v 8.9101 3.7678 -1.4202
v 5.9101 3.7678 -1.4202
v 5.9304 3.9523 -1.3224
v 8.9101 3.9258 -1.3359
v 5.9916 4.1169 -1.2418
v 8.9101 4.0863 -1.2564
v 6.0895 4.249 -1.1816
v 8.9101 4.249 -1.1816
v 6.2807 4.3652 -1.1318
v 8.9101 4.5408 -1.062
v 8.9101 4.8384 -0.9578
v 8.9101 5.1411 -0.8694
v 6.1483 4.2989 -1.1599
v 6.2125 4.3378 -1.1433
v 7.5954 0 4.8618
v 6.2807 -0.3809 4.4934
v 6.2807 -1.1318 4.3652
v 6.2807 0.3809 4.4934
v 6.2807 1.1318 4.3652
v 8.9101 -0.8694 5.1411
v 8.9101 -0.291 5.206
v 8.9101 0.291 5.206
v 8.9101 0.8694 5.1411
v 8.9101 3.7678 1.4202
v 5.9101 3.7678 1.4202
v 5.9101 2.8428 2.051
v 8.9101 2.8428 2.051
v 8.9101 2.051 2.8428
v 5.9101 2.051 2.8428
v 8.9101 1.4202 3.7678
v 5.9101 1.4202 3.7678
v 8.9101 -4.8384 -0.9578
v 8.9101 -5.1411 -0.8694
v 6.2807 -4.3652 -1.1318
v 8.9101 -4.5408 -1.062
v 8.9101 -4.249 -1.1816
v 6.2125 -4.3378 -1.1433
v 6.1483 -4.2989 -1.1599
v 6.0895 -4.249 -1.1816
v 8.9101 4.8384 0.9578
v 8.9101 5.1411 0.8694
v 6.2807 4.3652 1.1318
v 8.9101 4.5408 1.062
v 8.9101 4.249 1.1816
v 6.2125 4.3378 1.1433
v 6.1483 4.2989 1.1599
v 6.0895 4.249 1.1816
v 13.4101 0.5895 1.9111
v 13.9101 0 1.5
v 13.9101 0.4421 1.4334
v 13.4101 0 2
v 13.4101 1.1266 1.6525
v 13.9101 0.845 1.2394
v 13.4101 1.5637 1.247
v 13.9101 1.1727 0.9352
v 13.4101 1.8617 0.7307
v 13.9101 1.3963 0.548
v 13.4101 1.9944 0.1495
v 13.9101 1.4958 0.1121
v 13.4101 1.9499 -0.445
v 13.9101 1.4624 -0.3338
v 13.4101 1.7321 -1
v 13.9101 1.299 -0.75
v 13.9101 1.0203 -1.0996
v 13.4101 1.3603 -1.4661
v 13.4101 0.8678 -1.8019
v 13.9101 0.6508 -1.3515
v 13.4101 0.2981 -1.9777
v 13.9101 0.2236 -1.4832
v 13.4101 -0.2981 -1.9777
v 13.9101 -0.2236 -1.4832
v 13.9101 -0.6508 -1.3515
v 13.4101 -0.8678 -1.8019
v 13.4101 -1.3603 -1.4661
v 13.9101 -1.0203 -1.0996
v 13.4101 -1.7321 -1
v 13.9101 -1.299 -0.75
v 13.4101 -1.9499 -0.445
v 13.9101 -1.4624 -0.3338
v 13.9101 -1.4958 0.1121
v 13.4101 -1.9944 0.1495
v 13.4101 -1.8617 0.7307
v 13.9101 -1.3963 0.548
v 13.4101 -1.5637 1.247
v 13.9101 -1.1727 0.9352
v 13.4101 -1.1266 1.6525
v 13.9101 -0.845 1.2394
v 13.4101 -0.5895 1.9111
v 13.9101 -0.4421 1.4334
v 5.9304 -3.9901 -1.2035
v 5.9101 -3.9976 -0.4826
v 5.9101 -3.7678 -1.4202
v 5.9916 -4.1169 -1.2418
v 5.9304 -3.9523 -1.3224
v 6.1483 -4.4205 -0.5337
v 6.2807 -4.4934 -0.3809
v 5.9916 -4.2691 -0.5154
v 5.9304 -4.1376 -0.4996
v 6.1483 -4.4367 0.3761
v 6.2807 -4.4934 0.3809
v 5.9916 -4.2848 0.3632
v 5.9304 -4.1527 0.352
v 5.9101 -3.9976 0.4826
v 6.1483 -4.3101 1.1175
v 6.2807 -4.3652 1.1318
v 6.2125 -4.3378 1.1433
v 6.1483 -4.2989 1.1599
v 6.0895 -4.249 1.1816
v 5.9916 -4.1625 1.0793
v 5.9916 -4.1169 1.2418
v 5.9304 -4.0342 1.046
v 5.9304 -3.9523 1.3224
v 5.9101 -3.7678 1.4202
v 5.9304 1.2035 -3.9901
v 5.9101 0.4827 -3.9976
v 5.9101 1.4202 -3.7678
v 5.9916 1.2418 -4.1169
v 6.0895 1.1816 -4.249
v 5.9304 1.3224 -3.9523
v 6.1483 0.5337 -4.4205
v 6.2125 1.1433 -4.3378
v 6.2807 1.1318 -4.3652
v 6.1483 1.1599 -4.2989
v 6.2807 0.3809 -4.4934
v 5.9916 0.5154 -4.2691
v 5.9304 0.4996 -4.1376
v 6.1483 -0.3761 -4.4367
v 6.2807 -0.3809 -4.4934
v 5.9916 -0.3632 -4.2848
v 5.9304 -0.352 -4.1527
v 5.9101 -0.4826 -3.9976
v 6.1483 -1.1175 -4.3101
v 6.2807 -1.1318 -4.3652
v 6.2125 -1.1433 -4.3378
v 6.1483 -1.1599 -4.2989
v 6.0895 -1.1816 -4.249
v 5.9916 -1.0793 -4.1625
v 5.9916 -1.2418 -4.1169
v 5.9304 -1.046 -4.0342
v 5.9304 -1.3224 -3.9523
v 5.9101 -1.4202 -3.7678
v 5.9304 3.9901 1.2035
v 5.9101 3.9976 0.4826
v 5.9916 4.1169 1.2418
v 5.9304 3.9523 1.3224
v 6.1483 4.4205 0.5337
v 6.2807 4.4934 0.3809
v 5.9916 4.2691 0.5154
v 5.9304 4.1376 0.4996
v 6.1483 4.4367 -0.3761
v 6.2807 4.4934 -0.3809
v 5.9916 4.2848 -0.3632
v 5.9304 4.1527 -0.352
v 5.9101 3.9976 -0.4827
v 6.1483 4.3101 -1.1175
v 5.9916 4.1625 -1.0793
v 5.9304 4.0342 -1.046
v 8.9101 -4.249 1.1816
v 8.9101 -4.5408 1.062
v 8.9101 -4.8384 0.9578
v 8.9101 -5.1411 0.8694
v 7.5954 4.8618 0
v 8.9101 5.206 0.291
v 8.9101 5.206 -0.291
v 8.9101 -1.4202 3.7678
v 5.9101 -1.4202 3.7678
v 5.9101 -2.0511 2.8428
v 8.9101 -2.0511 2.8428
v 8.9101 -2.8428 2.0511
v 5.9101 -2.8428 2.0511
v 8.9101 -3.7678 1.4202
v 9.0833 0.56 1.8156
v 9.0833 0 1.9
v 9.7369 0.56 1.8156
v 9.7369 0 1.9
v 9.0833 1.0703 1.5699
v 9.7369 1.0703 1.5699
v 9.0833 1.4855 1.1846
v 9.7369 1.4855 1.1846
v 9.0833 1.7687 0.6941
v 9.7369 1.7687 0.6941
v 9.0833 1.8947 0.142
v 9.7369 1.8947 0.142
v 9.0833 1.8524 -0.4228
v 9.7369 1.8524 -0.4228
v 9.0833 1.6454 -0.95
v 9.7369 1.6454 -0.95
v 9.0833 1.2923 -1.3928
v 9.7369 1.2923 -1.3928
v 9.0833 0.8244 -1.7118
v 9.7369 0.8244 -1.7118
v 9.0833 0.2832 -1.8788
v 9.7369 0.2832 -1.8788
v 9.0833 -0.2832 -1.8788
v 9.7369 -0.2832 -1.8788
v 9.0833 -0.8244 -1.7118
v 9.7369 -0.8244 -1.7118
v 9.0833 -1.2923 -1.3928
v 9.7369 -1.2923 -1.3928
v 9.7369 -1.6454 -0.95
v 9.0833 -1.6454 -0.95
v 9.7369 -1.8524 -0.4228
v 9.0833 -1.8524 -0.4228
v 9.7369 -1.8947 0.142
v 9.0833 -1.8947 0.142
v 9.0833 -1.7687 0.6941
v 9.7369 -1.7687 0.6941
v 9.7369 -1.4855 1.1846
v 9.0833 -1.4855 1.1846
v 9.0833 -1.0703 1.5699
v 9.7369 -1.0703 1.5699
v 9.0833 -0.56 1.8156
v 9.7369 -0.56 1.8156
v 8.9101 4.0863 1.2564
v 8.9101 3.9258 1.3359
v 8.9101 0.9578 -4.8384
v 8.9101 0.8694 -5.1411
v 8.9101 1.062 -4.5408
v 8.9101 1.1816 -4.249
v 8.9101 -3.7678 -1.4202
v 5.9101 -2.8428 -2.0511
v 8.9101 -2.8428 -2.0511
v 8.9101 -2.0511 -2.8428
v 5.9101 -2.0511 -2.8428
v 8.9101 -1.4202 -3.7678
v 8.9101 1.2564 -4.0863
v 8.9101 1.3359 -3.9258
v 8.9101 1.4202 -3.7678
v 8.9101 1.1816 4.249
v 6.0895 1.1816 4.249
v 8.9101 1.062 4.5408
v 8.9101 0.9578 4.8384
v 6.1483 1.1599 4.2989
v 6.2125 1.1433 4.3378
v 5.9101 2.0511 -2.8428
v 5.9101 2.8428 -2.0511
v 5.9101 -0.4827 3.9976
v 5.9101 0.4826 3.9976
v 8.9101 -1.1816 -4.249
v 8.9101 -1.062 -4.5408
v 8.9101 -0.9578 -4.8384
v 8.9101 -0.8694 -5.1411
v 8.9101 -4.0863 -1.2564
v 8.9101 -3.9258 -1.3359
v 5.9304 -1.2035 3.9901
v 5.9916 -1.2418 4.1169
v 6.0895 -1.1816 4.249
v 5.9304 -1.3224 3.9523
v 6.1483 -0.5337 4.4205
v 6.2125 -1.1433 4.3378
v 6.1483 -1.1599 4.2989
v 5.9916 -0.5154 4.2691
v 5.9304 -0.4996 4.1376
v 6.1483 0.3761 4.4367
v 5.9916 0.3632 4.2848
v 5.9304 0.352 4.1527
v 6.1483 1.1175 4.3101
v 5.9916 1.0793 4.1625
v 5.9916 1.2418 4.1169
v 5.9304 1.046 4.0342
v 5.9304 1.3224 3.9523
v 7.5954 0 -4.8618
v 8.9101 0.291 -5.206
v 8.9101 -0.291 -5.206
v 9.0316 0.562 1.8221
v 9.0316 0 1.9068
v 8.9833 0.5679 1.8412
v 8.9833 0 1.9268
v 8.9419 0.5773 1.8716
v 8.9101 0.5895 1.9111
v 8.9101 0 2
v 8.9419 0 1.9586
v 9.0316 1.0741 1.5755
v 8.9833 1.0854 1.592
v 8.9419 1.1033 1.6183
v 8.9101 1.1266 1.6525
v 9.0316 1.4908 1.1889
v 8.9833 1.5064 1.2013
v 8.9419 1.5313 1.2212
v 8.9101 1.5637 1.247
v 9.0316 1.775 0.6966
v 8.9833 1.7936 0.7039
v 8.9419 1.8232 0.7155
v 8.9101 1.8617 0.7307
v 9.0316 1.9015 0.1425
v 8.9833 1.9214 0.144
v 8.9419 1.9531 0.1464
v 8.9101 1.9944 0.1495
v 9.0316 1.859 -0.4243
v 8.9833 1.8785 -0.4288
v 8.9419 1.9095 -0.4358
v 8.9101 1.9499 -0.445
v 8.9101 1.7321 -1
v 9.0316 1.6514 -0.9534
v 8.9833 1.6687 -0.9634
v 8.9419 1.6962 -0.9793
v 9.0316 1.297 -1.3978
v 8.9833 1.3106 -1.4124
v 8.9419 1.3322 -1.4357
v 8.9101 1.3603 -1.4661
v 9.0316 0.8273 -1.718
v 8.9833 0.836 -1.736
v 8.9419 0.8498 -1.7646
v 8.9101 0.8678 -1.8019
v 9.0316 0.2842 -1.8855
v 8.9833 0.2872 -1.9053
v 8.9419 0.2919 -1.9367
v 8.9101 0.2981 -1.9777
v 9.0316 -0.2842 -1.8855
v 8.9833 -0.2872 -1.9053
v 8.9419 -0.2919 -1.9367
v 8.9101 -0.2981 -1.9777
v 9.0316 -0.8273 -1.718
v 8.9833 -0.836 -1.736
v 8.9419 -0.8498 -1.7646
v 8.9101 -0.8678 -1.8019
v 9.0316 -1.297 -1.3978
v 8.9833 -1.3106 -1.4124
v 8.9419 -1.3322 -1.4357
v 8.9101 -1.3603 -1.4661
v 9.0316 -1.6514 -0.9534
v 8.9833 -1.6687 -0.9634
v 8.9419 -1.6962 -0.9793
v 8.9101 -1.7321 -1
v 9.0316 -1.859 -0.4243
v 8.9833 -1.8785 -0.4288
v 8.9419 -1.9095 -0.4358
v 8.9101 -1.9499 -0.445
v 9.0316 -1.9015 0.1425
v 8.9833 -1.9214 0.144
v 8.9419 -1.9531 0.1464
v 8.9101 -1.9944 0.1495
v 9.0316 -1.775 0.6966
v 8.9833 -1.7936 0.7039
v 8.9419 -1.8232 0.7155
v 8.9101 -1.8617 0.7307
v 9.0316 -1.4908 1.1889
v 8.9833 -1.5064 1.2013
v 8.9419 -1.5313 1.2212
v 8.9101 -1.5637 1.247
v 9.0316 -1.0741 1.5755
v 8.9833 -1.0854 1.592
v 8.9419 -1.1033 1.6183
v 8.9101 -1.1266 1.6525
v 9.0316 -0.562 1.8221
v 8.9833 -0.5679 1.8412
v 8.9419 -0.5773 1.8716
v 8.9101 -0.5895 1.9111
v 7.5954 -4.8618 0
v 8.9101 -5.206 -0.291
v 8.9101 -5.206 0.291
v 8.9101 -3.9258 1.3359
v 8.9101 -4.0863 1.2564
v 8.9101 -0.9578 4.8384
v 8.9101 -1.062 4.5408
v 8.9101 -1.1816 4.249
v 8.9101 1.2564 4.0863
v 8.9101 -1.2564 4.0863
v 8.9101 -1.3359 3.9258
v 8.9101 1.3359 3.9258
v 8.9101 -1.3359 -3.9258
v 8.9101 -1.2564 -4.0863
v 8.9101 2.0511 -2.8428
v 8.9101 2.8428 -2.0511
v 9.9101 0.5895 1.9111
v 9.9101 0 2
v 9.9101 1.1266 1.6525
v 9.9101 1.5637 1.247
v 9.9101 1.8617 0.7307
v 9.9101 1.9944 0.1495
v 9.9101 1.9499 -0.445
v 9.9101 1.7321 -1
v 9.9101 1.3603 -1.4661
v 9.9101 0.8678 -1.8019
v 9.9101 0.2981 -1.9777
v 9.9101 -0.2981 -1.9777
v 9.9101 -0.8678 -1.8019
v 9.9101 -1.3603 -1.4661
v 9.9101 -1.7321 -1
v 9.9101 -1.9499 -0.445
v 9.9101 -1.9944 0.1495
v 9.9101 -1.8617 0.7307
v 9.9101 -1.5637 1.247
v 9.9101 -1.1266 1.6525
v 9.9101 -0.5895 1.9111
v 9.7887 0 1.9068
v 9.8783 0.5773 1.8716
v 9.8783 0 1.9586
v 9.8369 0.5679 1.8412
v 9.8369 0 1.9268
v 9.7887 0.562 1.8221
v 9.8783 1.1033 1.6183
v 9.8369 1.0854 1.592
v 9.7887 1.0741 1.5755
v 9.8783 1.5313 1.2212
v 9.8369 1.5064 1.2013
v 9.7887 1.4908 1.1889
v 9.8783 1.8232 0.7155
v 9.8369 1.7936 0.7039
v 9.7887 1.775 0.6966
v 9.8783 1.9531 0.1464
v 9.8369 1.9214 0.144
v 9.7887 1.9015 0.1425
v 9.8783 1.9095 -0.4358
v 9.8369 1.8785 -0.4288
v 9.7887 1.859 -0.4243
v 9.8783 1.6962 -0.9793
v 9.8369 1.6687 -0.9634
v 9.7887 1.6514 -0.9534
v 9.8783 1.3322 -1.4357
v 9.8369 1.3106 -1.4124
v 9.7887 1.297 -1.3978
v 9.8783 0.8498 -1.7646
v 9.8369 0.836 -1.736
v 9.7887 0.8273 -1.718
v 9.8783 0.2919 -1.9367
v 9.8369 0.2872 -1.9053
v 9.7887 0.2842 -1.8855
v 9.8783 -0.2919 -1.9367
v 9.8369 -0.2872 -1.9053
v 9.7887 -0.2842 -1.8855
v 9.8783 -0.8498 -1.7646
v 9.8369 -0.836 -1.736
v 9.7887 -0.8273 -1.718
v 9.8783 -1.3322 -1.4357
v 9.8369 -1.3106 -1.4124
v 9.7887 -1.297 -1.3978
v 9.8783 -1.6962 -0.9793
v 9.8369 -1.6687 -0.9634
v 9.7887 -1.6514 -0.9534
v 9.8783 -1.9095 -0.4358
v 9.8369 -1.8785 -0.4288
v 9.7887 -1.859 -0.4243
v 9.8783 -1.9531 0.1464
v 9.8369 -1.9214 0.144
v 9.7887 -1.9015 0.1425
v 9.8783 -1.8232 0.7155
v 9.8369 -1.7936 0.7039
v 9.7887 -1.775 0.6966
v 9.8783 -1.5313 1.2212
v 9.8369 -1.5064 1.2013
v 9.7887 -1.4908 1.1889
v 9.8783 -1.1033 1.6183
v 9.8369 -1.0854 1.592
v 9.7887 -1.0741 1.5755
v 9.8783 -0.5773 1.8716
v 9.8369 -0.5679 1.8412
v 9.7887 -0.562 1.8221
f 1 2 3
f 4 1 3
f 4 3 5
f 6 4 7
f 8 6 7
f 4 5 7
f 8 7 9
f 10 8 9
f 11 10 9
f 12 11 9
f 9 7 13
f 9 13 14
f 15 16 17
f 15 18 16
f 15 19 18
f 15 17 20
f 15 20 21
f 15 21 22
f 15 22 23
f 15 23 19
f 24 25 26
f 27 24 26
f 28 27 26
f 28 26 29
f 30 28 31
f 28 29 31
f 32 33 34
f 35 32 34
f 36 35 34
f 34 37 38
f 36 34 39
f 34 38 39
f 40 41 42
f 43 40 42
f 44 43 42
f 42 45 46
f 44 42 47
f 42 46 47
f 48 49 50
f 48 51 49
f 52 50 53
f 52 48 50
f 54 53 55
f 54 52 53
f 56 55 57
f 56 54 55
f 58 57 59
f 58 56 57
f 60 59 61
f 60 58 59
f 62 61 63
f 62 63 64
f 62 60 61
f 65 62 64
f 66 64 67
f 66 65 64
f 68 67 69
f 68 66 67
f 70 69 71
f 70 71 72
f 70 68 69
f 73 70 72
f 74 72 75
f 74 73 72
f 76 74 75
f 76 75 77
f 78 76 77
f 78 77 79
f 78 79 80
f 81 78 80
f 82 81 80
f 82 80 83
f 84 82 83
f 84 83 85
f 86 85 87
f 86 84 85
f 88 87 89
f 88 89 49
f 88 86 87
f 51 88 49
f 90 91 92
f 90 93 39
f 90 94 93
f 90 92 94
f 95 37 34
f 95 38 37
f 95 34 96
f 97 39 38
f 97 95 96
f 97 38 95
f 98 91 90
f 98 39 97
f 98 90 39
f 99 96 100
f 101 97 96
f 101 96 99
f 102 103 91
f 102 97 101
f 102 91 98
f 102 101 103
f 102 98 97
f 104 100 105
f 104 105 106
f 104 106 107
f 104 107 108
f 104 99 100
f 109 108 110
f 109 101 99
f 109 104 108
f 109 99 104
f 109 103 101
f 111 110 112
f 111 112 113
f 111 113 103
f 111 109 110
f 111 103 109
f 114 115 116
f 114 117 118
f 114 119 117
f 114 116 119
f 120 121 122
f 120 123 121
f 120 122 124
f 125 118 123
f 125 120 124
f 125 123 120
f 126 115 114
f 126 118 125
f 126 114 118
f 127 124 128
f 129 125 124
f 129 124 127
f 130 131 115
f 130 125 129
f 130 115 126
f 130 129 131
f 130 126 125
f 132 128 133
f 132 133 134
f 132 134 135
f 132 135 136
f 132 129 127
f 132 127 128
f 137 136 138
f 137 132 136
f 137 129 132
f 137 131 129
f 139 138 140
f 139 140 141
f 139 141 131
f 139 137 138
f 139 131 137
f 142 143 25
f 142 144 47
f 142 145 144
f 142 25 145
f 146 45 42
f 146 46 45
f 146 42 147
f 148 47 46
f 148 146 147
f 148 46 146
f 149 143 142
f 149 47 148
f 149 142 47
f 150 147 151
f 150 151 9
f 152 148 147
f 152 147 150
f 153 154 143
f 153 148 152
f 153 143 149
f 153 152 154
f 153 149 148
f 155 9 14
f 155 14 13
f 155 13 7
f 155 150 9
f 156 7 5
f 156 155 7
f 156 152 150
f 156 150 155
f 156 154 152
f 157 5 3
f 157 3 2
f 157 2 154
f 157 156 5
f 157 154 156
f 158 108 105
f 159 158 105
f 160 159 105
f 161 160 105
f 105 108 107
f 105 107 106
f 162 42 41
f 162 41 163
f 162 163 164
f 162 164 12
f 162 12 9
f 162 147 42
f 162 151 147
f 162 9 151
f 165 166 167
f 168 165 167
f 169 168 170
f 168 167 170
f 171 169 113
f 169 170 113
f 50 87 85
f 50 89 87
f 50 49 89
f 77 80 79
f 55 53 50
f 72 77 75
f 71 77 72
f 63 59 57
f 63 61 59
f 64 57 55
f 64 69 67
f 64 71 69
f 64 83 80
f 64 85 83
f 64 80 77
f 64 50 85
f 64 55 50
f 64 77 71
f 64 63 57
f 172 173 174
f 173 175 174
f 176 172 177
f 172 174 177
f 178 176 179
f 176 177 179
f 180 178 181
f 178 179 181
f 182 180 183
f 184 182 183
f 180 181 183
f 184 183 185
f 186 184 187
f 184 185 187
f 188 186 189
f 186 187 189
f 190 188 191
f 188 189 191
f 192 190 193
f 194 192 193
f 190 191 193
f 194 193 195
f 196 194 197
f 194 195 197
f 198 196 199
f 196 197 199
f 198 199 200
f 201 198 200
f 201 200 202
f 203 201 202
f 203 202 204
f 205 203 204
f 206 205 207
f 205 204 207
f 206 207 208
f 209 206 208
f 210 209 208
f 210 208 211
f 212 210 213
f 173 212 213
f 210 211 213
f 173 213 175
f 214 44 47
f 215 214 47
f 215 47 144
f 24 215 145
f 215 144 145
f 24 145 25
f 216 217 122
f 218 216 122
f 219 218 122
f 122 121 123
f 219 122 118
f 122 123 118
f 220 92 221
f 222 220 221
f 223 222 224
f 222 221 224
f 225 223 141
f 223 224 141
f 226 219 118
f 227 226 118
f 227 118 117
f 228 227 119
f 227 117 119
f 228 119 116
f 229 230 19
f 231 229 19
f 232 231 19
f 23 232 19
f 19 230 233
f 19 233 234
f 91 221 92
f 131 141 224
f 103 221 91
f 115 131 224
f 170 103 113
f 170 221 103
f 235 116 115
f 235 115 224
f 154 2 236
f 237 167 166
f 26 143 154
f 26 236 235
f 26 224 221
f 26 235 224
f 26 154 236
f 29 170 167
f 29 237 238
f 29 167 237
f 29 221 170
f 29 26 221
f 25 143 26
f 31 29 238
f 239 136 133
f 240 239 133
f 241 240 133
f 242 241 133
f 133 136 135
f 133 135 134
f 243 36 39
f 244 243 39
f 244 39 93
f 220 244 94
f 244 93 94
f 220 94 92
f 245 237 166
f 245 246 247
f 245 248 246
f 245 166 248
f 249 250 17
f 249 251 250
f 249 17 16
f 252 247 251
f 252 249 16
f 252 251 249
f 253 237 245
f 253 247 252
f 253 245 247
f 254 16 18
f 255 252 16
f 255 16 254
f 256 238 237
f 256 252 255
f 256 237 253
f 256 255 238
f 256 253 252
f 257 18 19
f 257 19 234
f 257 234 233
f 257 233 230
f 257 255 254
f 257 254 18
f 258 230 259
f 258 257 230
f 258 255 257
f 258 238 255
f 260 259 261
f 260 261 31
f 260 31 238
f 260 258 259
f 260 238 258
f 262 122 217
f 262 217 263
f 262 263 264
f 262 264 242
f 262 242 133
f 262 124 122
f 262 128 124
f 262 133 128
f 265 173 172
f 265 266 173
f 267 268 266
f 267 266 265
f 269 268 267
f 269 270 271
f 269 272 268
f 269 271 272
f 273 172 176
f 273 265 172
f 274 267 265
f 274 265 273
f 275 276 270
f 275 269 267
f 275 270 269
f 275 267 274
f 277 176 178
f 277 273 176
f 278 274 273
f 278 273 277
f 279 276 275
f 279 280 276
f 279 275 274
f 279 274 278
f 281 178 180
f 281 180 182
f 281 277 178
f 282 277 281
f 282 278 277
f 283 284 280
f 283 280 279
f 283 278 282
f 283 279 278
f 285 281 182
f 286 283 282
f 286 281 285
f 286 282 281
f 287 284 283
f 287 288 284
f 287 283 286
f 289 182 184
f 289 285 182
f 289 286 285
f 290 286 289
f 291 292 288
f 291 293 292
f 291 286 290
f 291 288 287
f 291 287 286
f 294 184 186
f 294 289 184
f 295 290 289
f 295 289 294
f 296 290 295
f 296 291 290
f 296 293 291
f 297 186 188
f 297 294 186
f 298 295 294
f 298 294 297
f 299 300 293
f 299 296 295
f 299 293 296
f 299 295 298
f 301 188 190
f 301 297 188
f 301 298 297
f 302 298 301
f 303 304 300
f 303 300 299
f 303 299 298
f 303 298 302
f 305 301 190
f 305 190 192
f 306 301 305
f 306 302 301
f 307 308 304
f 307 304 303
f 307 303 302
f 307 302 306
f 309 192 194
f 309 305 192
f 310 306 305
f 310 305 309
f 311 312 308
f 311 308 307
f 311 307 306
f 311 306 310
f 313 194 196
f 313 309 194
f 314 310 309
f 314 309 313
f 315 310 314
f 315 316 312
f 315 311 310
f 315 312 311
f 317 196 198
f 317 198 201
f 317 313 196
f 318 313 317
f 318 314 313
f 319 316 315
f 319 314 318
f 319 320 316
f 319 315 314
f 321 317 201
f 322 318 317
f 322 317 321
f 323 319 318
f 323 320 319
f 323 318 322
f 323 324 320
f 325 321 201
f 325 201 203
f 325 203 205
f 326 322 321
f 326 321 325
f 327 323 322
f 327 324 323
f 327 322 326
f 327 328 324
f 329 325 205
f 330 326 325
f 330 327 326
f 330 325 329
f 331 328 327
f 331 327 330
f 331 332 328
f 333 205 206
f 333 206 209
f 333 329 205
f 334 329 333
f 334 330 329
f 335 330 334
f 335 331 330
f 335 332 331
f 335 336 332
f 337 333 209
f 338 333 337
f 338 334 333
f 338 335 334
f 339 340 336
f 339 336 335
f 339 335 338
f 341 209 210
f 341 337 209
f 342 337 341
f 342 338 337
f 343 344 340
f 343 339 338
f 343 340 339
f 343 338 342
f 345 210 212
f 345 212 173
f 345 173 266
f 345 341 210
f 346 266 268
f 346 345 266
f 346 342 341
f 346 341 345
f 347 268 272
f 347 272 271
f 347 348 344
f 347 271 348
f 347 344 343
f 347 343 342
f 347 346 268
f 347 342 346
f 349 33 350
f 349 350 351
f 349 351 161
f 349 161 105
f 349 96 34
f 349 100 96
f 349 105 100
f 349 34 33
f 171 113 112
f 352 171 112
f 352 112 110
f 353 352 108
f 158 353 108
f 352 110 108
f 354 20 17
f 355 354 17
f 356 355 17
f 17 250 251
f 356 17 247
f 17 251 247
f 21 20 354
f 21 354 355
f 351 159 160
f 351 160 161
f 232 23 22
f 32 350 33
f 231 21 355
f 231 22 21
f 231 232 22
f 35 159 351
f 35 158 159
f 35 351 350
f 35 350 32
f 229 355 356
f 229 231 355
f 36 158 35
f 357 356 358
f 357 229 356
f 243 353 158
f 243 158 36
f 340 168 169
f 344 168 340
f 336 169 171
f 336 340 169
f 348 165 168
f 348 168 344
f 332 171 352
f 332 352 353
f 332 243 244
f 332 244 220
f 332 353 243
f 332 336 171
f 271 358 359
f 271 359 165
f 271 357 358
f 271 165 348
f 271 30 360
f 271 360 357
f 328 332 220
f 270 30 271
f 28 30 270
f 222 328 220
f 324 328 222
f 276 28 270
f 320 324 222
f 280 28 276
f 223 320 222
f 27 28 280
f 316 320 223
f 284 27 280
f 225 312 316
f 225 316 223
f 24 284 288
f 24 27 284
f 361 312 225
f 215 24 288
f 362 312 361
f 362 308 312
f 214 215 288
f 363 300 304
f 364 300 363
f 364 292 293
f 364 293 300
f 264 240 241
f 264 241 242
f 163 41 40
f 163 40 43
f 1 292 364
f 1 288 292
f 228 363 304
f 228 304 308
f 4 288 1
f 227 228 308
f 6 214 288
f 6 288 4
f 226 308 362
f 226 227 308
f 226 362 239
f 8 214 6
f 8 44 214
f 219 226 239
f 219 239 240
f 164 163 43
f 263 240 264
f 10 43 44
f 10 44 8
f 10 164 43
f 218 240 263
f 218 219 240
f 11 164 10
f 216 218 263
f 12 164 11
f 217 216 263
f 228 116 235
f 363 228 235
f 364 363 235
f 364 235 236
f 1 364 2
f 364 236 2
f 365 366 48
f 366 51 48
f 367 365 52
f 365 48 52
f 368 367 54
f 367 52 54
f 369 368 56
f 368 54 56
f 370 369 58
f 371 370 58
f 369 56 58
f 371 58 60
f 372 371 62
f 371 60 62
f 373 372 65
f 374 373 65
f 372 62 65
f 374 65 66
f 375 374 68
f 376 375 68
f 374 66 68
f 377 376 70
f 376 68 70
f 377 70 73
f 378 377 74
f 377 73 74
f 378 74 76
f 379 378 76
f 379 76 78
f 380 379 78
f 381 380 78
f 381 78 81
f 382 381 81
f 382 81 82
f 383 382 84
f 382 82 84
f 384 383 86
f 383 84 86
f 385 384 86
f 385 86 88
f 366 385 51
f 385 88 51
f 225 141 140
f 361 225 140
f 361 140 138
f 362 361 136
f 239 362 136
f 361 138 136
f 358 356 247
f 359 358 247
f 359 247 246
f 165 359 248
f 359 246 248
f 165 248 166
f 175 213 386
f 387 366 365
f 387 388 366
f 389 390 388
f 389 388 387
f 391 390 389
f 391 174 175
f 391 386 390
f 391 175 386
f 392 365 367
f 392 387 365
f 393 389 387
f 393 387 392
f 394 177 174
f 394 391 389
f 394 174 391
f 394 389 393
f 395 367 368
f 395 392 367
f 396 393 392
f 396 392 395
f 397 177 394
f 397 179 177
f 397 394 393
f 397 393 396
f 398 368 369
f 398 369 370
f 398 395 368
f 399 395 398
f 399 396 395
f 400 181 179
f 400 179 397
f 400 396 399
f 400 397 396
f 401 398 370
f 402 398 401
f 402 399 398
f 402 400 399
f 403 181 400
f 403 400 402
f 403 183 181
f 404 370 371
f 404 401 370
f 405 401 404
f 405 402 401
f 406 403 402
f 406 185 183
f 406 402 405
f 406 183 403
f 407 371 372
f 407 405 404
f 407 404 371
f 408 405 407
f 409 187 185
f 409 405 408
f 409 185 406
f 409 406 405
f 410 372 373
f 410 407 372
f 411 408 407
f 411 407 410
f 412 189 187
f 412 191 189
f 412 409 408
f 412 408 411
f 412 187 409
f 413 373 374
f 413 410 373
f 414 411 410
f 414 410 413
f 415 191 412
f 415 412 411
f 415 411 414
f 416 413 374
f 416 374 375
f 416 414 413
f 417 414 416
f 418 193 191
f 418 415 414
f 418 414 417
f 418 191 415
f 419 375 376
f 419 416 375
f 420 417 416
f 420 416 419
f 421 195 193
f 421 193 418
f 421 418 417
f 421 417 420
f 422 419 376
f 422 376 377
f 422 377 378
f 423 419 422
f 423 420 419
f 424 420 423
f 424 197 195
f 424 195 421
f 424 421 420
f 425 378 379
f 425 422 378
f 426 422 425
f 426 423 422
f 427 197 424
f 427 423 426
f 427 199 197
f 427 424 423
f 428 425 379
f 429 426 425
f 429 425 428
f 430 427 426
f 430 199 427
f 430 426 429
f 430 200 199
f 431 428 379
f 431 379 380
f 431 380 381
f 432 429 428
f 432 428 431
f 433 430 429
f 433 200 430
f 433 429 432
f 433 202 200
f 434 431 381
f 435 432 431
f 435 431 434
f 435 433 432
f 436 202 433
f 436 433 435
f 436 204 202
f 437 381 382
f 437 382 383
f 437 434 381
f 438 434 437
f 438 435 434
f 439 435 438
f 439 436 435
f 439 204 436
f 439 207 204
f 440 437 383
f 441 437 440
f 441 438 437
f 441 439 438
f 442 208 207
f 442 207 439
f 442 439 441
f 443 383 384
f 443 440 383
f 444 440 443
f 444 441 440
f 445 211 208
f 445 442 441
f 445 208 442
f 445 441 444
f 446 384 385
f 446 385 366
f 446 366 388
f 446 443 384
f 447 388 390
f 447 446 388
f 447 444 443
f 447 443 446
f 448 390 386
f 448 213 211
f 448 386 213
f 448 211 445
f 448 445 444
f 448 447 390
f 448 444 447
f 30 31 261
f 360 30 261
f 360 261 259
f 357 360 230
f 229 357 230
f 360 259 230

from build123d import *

# Parameters (mm, degrees)
F0_W     = 3.5
F0_H     = 2
F0_W_2   = 0.65359
F0_H_2   = 1.9
F3_DEPTH = 25


# Not quite as in the source:
# - ends of sketch curves that miss each other by under 0.0002 mm in the source are joined


with BuildPart() as f1:
    # F0 (on Front) → F1 (revolve)
    with BuildSketch(Plane.XZ):
        with BuildLine():
            ThreePointArc((6.2807068037, 4.5095537326), (6.0134401175, 4.3309714378), (5.910117, 4.026591))
            Line((5.910117, 4.026591), (5.910117, 0))
            Line((5.910117, 0), (8.910117, 0))
            Line((8.910117, 0), (8.910117, 1.999999965))
            Line((8.910117, 1.999999965), (8.910117, 5.214102))
            Line((8.910117, 5.214102), (6.2807068037, 4.5095537326))
        make_face()
        with BuildLine():
            Line((9.736912, 1.9), (9.736912, 0))
            Line((9.736912, 0), (9.910117, 0))
            Line((9.910117, 0), (9.910117, 2))
            ThreePointArc((9.9101170606, 1.999999965), (9.8369119825, 1.9267949091), (9.736912, 1.9))
        make_face()
        with Locations((11.660117, 1)):
            Rectangle(F0_W, F0_H)
        with Locations((9.410117, 0.95)):
            Rectangle(F0_W_2, F0_H_2)
        with BuildLine():
            Line((8.910117, 1.999999965), (8.910117, 0))
            Line((8.910117, 0), (9.083322, 0))
            Line((9.083322, 0), (9.083322, 1.9))
            ThreePointArc((9.083322, 1.9), (8.9833220175, 1.9267949091), (8.9101169394, 1.999999965))
        make_face()
        Polygon((13.410117, 2), (13.410117, 0), (13.910117, 0), (13.910117, 1.5), align=None)
    revolve(axis=Axis((10.414001145, 0, 0), (-1, 0, 0)))

    # F2 (on face) → F3 (cut)
    with BuildSketch(Plane(origin=(5.910117, 0, 0), x_dir=(0, -1, 0), z_dir=(-1, 0, 0))):
        with BuildLine():
            ThreePointArc((1.1816228772, -4.2490125583), (1.0079083628, -4.6889045584), (0.8693810599, -5.1411123543))
            ThreePointArc((0.8693810599, -5.1411123543), (3.686926882, -3.686926882), (5.1411123543, -0.8693810599))
            ThreePointArc((5.1411123543, -0.8693810599), (4.6889045584, -1.0079083628), (4.2490125583, -1.1816228772))
            ThreePointArc((4.2490125583, -1.1816228772), (4.0057430921, -1.2955299839), (3.7678156951, -1.420211241))
            ThreePointArc((3.7678156951, -1.420211241), (2.8472298012, -2.8472298012), (1.420211241, -3.7678156951))
            ThreePointArc((1.420211241, -3.7678156951), (1.2955299839, -4.0057430921), (1.1816228772, -4.2490125583))
        make_face()
        with BuildLine():
            ThreePointArc((-5.1411123543, -0.8693810599), (-3.686926882, -3.686926882), (-0.8693810599, -5.1411123543))
            ThreePointArc((-0.8693810599, -5.1411123543), (-1.0079083664, -4.6889048876), (-1.1816228201, -4.2490132008))
            ThreePointArc((-1.1816228201, -4.2490132008), (-1.2955301515, -4.0057433246), (-1.4202116652, -3.7678155352))
            ThreePointArc((-1.4202116652, -3.7678155352), (-2.8472298012, -2.8472298012), (-3.7678155352, -1.4202116652))
            ThreePointArc((-3.7678155352, -1.4202116652), (-4.0057429748, -1.2955303249), (-4.2490124865, -1.1816231353))
            ThreePointArc((-4.2490124865, -1.1816231353), (-4.6889045191, -1.0079084953), (-5.1411123543, -0.8693810599))
        make_face()
        with BuildLine():
            ThreePointArc((4.2490125583, 1.1816228772), (4.6889045584, 1.0079083628), (5.1411123543, 0.8693810599))
            ThreePointArc((5.1411123543, 0.8693810599), (3.686926882, 3.686926882), (0.8693810599, 5.1411123543))
            ThreePointArc((0.8693810599, 5.1411123543), (1.0079083628, 4.6889045584), (1.1816228772, 4.2490125583))
            ThreePointArc((1.1816228772, 4.2490125583), (1.2955299839, 4.0057430921), (1.420211241, 3.7678156951))
            ThreePointArc((1.420211241, 3.7678156951), (2.8472298012, 2.8472298012), (3.7678156951, 1.420211241))
            ThreePointArc((3.7678156951, 1.420211241), (4.0057430921, 1.2955299839), (4.2490125583, 1.1816228772))
        make_face()
        with BuildLine():
            ThreePointArc((3.7678156951, -1.420211241), (2.4284046412, -2.4284046412), (1.420211241, -3.7678156951))
            ThreePointArc((1.420211241, -3.7678156951), (2.8472298012, -2.8472298012), (3.7678156951, -1.420211241))
        make_face()
        with BuildLine():
            ThreePointArc((-0.8693810599, 5.1411123543), (-3.686926882, 3.686926882), (-5.1411123543, 0.8693810599))
            ThreePointArc((-5.1411123543, 0.8693810599), (-4.6889043312, 1.0079080153), (-4.2490121021, 1.1816222641))
            ThreePointArc((-4.2490121021, 1.1816222641), (-4.0057431642, 1.295528931), (-3.7678162701, 1.4202097156))
            ThreePointArc((-3.7678162701, 1.4202097156), (-2.8472298012, 2.8472298012), (-1.4202097156, 3.7678162701))
            ThreePointArc((-1.4202097156, 3.7678162701), (-1.2955287576, 4.0057435139), (-1.181621949, 4.2490128164))
            ThreePointArc((-1.181621949, 4.2490128164), (-1.0079078864, 4.6889046997), (-0.8693810599, 5.1411123543))
        make_face()
        with BuildLine():
            ThreePointArc((-3.7678155352, -1.4202116652), (-2.8472298012, -2.8472298012), (-1.4202116652, -3.7678155352))
            ThreePointArc((-1.4202116652, -3.7678155352), (-2.4284049327, -2.4284049327), (-3.7678155352, -1.4202116652))
        make_face()
        with BuildLine():
            ThreePointArc((1.420211241, 3.7678156951), (2.4284046412, 2.4284046412), (3.7678156951, 1.420211241))
            ThreePointArc((3.7678156951, 1.420211241), (2.8472298012, 2.8472298012), (1.420211241, 3.7678156951))
        make_face()
        with BuildLine():
            ThreePointArc((-1.4202097156, 3.7678162701), (-2.8472298012, 2.8472298012), (-3.7678162701, 1.4202097156))
            ThreePointArc((-3.7678162701, 1.4202097156), (-2.428403593, 2.428403593), (-1.4202097156, 3.7678162701))
        make_face()
    extrude(amount=-F3_DEPTH, mode=Mode.SUBTRACT)


solid = f1.part
